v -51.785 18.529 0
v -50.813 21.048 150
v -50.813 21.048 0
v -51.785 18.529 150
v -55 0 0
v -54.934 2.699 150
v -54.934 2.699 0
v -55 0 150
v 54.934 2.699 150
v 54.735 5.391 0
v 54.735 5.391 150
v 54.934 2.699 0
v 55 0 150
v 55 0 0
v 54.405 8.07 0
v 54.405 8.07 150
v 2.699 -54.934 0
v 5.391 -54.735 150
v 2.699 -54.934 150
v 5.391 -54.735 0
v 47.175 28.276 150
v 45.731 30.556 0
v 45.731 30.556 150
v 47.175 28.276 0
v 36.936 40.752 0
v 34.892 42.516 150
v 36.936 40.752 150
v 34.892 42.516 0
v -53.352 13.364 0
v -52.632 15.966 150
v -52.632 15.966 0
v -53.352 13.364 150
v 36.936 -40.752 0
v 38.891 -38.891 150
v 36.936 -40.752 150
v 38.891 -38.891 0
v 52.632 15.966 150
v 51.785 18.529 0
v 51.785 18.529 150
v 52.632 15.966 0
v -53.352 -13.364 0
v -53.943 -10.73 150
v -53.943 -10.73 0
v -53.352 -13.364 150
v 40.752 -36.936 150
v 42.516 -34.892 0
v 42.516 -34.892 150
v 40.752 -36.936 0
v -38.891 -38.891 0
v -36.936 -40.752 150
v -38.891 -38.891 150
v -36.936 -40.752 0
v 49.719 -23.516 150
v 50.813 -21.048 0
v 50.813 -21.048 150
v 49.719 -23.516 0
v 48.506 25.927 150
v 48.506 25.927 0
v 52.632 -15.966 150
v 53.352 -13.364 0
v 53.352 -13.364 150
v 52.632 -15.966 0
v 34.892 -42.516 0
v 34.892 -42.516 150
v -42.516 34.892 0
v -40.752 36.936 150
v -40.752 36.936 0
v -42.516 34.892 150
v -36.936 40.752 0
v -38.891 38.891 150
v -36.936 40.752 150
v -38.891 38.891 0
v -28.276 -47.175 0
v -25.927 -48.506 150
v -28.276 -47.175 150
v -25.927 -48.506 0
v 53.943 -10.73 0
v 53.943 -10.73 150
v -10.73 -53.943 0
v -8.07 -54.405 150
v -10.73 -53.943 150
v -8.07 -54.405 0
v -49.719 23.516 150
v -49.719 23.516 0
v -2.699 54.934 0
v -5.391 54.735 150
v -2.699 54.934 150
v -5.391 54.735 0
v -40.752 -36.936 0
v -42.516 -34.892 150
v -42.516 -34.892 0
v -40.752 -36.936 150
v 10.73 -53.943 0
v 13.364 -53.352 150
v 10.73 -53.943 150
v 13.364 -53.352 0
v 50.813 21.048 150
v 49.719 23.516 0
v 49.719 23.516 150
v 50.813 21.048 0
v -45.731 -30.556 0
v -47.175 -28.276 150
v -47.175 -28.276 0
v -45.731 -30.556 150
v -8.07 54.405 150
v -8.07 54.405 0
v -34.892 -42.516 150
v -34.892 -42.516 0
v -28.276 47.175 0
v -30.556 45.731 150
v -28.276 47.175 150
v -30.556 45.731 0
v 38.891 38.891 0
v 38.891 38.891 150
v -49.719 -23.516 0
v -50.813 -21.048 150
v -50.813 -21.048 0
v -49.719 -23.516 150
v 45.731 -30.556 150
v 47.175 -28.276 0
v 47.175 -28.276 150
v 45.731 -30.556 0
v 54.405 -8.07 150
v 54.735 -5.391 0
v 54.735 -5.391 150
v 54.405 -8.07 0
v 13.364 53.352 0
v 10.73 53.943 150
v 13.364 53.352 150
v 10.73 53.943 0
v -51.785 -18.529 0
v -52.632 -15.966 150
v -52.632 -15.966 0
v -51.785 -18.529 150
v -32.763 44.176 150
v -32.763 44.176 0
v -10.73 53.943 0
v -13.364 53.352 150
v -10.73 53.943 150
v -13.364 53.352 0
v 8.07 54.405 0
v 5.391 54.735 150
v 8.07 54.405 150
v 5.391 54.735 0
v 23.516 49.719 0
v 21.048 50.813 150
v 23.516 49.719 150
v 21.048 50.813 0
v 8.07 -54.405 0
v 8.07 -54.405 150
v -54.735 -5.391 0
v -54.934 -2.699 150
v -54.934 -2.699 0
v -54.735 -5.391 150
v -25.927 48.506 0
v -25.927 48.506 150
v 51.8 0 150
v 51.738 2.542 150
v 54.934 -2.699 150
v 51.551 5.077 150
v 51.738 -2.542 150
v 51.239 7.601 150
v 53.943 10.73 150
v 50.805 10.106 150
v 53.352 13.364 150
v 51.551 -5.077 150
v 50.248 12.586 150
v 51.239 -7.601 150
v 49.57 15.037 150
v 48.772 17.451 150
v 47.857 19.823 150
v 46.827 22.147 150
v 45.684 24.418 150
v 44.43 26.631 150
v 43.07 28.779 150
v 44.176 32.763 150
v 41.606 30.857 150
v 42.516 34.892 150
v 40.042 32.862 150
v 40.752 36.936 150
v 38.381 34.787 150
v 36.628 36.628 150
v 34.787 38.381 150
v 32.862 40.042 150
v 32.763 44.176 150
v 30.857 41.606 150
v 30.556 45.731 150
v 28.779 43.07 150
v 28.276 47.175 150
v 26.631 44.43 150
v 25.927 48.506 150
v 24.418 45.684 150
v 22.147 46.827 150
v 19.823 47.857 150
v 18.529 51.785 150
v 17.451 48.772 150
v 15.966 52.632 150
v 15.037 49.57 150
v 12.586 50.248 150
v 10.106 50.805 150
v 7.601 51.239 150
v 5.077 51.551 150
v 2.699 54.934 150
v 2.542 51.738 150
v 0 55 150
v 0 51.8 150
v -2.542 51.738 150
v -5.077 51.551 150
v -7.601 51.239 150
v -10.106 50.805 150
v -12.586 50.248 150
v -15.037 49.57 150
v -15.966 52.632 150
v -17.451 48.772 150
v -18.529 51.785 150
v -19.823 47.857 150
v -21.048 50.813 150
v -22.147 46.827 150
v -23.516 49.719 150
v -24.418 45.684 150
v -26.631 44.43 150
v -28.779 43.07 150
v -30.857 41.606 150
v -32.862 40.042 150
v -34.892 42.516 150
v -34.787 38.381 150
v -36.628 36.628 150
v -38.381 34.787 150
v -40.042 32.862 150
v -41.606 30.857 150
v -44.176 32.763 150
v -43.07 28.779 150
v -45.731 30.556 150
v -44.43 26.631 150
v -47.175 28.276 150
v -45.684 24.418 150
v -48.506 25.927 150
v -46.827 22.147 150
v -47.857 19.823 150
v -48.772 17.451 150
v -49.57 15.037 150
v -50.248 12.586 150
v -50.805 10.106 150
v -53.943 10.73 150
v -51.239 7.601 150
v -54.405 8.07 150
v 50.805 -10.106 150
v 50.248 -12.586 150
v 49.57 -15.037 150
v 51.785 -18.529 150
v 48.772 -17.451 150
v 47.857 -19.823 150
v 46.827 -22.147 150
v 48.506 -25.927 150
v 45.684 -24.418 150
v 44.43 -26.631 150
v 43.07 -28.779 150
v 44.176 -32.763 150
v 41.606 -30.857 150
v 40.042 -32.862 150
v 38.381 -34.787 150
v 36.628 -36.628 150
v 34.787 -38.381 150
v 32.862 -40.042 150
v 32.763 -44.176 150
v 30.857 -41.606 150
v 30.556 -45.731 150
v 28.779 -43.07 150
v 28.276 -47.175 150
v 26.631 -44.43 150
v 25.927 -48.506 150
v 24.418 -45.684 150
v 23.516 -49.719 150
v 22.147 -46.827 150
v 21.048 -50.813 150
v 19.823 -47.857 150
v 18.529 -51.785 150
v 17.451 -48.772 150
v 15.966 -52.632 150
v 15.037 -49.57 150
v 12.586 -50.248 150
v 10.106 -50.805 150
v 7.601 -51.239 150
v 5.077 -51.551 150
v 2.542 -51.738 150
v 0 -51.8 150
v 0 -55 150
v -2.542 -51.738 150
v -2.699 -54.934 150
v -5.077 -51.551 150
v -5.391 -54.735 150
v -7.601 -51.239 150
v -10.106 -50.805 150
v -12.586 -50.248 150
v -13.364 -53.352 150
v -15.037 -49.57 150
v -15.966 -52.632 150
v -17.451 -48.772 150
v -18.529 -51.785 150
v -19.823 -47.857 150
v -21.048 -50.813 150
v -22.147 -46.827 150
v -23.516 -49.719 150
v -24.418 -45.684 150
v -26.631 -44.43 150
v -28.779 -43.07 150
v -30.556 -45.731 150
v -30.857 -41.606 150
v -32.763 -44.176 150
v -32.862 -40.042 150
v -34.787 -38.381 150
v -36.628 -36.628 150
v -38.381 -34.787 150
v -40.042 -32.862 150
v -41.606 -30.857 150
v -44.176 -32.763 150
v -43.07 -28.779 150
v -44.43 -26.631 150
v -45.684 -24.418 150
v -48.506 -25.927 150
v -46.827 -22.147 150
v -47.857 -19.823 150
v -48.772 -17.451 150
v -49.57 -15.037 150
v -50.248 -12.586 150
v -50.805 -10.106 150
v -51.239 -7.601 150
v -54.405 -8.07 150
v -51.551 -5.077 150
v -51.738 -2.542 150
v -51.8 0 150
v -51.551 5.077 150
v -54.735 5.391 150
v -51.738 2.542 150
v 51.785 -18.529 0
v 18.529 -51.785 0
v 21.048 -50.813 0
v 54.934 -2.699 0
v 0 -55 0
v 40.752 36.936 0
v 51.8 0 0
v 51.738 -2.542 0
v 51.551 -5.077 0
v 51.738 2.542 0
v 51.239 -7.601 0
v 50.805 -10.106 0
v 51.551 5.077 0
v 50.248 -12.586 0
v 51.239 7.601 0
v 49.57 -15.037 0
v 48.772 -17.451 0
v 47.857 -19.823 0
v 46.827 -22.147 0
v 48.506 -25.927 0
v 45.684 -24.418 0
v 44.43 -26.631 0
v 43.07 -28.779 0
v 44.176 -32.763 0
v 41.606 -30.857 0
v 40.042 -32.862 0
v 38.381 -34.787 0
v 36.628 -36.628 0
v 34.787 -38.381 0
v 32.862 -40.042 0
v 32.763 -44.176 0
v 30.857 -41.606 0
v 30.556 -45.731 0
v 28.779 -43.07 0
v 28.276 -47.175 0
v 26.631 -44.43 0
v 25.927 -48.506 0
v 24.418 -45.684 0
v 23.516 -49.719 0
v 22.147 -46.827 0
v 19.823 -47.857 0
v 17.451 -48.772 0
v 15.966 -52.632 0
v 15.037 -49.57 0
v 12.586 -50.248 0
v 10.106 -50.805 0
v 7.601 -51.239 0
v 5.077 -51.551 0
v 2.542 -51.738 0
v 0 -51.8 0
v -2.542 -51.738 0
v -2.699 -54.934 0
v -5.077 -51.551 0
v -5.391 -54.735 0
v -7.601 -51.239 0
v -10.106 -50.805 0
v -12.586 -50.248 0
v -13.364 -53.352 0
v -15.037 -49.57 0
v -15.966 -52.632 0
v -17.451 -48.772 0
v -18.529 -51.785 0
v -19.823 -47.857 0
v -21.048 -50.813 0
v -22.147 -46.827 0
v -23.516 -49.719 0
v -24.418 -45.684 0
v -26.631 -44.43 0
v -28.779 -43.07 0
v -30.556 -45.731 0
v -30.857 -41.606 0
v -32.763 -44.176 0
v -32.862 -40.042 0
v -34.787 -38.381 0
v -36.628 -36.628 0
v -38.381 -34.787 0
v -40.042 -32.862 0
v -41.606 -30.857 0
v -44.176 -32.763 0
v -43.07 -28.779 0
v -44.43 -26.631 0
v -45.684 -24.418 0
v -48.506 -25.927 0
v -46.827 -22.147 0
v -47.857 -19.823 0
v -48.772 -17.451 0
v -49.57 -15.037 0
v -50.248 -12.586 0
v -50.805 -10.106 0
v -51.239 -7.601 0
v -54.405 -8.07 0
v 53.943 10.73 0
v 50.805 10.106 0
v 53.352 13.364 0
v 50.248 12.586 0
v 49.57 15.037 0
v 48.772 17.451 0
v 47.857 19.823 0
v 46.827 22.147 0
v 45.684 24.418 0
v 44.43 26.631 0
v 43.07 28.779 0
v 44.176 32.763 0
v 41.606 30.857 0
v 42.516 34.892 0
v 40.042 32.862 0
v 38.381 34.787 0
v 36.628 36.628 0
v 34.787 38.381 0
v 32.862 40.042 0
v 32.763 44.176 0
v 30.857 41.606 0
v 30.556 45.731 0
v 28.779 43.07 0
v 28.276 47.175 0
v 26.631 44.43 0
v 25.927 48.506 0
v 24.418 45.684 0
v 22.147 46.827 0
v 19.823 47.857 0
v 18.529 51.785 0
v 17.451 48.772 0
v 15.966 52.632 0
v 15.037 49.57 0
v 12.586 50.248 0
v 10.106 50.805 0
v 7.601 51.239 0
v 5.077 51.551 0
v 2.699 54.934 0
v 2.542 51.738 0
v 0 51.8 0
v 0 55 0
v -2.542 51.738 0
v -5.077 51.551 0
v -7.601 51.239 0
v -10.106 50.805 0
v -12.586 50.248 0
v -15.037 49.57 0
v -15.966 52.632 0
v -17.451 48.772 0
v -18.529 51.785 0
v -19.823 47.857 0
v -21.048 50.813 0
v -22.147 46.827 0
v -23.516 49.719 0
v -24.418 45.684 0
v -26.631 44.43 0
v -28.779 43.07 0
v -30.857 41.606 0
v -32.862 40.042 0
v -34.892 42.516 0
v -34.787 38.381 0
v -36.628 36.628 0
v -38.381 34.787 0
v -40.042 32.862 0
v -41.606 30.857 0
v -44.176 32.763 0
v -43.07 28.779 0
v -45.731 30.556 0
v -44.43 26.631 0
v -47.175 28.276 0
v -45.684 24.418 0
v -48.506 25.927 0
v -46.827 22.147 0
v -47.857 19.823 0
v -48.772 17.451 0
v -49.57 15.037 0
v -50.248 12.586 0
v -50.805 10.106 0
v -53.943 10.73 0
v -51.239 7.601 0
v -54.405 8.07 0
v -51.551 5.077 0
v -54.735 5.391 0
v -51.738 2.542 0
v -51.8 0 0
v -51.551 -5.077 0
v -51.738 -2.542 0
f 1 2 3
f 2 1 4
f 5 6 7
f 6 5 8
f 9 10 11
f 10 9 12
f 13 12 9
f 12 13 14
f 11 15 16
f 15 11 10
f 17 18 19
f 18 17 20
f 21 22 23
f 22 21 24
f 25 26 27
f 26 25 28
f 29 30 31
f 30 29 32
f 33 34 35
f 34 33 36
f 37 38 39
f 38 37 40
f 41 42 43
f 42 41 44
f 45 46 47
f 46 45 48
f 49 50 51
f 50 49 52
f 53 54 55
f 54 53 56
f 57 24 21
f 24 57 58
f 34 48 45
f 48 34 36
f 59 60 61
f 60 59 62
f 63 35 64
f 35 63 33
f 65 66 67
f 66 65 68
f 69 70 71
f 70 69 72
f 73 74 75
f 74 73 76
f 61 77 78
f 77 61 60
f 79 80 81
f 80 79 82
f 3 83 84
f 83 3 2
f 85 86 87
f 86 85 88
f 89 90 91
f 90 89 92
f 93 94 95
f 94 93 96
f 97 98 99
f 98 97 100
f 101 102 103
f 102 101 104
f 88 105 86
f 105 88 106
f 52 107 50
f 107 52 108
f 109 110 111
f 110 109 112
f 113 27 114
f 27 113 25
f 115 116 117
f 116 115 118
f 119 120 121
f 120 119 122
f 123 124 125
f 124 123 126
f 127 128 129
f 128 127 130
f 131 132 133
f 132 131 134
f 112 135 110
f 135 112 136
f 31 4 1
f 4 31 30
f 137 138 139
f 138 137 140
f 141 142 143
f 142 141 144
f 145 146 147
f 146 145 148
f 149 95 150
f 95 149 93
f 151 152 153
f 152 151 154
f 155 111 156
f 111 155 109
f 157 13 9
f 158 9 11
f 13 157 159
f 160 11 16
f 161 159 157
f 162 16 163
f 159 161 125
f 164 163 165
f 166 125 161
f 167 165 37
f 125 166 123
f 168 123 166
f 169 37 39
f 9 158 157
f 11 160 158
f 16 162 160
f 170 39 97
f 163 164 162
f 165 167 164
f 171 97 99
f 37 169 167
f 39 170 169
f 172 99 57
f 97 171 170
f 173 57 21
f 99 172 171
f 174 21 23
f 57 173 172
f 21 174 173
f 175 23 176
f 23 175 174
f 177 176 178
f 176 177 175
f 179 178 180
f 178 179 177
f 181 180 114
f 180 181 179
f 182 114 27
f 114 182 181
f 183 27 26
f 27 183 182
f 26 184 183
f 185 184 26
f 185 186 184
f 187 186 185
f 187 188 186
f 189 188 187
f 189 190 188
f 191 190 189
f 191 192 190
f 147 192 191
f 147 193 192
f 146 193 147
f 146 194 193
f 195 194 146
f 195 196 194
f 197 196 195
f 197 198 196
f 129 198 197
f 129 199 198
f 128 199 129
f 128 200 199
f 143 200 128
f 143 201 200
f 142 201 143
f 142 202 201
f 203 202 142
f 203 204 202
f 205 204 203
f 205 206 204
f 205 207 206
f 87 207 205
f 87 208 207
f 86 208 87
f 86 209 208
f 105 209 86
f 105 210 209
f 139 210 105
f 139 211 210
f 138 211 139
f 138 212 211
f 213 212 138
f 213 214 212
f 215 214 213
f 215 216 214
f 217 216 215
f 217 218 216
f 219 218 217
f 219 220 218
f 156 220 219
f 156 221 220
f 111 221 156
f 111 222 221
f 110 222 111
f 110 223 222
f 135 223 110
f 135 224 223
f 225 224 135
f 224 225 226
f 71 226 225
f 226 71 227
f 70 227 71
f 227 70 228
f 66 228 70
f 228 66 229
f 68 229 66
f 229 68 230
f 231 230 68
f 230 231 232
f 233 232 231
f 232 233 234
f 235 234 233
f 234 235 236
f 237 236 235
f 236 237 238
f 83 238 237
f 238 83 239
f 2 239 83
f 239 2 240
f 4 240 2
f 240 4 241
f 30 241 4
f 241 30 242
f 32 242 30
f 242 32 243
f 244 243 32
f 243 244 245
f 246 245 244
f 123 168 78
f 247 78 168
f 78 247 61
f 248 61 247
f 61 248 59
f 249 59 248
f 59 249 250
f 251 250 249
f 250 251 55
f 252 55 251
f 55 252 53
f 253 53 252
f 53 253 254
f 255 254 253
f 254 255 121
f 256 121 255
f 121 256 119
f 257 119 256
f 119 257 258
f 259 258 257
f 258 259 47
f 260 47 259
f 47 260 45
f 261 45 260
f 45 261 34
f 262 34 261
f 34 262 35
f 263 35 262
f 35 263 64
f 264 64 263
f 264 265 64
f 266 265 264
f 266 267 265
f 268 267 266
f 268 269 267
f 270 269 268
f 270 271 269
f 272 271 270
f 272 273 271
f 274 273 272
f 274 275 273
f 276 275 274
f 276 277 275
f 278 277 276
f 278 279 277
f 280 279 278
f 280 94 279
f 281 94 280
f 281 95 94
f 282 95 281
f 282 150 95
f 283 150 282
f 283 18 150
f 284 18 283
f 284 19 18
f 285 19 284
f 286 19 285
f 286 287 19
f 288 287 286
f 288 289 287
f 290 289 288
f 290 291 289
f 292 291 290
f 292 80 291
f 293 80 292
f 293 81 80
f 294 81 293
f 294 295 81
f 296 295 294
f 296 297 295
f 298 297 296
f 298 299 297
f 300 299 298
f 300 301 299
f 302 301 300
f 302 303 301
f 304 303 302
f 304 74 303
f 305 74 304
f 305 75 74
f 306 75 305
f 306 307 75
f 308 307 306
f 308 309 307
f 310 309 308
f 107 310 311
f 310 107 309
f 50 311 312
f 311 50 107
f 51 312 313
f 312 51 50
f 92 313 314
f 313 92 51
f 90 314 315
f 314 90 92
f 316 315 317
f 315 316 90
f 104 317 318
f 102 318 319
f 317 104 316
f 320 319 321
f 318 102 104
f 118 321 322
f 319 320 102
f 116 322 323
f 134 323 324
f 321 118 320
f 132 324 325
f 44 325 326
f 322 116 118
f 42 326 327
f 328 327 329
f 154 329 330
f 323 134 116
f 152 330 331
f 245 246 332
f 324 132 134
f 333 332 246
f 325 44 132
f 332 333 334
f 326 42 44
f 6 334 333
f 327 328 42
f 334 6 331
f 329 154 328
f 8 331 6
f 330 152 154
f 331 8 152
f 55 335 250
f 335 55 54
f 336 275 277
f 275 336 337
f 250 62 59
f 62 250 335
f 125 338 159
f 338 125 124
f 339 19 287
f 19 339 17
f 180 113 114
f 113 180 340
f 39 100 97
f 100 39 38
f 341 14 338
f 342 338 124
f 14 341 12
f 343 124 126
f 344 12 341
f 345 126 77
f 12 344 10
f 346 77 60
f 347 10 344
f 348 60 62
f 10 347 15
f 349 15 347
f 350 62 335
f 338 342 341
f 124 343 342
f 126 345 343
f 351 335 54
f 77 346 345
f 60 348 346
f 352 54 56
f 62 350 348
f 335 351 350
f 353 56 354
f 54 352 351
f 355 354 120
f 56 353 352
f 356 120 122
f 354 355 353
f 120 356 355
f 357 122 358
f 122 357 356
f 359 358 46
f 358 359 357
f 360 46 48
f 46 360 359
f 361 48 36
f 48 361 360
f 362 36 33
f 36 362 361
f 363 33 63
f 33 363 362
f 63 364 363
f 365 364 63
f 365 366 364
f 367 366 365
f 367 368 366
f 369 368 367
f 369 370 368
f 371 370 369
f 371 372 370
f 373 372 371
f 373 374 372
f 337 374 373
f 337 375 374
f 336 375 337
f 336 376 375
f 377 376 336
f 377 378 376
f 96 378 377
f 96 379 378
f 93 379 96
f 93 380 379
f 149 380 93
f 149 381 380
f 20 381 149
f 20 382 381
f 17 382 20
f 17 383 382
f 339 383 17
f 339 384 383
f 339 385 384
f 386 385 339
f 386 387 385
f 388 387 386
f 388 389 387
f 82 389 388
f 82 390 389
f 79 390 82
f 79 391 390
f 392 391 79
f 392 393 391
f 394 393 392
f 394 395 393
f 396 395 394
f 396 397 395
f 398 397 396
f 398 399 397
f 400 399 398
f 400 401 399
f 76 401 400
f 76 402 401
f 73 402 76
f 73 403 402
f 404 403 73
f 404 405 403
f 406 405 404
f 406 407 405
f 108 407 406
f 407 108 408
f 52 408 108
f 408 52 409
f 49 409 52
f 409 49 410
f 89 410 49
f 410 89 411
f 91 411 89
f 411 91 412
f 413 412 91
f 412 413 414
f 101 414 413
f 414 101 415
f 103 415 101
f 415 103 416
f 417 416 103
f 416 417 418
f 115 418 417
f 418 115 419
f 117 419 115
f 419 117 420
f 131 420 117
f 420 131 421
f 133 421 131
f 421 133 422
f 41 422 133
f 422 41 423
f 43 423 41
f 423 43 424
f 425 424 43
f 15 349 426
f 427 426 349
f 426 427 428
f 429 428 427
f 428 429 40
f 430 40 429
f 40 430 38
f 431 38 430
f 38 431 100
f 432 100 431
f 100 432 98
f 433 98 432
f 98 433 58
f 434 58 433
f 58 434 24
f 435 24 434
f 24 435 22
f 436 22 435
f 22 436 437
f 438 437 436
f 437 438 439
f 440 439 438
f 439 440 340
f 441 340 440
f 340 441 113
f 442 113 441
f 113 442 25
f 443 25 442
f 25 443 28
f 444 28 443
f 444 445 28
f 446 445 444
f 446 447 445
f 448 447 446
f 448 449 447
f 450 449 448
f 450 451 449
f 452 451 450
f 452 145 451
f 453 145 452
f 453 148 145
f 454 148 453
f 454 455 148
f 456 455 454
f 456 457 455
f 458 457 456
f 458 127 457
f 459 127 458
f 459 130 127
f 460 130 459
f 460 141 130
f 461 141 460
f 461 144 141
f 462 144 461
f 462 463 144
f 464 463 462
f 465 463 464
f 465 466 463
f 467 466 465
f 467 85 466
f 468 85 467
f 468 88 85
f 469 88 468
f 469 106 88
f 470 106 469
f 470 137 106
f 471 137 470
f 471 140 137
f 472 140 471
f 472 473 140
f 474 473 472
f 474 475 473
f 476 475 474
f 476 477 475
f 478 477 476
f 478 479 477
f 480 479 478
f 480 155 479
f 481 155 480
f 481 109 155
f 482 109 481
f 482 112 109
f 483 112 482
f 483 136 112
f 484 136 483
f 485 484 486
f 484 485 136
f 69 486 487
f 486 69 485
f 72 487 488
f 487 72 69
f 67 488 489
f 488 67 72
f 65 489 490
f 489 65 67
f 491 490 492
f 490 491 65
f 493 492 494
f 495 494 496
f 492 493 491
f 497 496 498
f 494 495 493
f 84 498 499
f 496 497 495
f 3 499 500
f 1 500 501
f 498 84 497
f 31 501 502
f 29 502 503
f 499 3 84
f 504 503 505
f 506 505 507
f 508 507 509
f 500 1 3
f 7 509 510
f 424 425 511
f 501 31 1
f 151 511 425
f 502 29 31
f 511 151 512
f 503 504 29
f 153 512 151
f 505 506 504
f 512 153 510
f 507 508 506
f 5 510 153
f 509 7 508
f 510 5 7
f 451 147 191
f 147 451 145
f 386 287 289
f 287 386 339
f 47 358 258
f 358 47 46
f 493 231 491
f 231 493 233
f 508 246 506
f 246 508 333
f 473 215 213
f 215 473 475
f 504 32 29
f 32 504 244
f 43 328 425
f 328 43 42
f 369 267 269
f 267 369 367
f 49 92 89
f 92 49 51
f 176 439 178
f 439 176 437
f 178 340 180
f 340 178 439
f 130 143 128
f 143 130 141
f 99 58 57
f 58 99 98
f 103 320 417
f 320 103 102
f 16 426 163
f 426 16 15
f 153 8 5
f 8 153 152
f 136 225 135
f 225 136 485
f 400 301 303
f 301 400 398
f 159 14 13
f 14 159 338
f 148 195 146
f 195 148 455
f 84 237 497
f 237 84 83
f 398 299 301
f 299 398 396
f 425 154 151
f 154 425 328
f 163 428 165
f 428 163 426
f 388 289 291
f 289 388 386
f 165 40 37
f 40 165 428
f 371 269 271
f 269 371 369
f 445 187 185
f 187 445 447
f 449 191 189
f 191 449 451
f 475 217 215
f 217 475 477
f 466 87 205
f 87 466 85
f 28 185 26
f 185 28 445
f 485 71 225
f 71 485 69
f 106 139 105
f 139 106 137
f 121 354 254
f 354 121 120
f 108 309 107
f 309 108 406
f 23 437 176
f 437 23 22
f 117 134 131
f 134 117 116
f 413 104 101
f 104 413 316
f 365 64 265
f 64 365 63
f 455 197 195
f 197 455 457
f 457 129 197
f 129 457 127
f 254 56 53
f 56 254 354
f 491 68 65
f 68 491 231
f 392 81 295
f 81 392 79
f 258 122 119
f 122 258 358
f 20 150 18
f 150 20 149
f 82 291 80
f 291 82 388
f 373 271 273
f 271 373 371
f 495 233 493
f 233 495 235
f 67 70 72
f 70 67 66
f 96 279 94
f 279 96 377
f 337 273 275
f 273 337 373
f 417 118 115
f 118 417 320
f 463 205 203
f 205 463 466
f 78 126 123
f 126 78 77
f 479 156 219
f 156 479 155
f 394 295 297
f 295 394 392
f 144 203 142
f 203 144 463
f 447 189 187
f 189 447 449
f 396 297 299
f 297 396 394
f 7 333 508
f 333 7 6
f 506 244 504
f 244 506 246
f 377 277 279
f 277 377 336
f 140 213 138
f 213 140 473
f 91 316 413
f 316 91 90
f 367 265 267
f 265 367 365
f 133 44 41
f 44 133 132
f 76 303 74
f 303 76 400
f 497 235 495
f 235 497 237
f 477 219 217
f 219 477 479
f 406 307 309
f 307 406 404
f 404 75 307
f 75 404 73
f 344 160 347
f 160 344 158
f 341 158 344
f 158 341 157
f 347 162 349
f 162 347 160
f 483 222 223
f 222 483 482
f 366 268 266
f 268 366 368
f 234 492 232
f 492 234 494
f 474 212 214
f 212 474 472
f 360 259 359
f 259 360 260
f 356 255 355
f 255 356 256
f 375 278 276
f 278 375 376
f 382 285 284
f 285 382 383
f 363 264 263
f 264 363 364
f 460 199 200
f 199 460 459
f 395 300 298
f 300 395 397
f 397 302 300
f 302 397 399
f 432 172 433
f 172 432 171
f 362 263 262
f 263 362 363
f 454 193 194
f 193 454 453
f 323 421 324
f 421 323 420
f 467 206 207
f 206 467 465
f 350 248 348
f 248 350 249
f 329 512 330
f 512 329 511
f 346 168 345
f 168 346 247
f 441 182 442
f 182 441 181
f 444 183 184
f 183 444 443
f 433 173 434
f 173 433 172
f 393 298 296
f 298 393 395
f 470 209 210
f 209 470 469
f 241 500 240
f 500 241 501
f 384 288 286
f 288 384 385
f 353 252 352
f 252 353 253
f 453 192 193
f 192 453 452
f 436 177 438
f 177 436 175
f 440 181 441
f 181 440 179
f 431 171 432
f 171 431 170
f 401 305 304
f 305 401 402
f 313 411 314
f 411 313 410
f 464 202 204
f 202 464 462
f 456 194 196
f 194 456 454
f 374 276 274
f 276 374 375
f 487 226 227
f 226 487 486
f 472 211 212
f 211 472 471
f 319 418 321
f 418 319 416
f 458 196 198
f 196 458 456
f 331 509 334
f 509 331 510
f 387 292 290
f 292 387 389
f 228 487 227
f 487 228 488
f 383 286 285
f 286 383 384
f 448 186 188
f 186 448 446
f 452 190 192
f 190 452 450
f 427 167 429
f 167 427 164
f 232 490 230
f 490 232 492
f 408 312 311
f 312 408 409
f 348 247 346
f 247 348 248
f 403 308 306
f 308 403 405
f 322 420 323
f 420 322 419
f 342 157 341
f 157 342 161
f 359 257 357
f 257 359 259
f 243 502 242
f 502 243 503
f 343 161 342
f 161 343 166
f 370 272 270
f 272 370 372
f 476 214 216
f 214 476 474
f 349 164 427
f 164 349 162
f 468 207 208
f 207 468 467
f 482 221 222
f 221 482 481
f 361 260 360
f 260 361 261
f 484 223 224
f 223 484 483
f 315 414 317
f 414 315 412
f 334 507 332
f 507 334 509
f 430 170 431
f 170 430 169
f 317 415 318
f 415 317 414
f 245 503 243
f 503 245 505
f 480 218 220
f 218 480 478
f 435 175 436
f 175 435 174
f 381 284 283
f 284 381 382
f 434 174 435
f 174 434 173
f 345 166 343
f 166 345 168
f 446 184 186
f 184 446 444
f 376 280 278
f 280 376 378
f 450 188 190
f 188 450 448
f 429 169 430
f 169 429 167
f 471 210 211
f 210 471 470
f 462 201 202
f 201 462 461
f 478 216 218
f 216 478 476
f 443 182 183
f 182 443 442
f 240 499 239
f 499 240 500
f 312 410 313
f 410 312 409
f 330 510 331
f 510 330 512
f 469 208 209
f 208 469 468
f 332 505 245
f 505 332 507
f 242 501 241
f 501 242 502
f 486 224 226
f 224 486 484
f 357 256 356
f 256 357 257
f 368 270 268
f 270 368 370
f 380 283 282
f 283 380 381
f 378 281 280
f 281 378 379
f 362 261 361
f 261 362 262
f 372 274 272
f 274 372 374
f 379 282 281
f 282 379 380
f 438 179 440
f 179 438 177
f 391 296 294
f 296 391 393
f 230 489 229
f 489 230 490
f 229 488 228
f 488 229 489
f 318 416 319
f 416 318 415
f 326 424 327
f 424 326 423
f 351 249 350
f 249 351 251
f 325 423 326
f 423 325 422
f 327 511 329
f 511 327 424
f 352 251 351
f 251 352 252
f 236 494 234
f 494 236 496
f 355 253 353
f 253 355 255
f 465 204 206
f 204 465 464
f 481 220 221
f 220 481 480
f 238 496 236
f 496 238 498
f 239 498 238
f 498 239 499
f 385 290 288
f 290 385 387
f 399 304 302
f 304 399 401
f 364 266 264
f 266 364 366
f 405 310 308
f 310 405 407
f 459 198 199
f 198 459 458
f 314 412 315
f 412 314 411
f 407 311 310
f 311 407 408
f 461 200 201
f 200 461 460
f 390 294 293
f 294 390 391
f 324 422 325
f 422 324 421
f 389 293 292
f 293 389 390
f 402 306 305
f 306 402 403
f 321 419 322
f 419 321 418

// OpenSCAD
$fn = 128;

// HT pipe parameters (approximate for HT 110)
outer_d = 110;      // mm
wall_t  = 3.2;      // mm (typical HT pipe wall thickness)
length  = 150;      // mm

inner_d = outer_d - 2*wall_t;

module ht_pipe(od, id, h) {
    difference() {
        cylinder(d=od, h=h, center=false);
        translate([0,0,-0.1])
            cylinder(d=id, h=h+0.2, center=false);
    }
}

ht_pipe(outer_d, inner_d, length);
